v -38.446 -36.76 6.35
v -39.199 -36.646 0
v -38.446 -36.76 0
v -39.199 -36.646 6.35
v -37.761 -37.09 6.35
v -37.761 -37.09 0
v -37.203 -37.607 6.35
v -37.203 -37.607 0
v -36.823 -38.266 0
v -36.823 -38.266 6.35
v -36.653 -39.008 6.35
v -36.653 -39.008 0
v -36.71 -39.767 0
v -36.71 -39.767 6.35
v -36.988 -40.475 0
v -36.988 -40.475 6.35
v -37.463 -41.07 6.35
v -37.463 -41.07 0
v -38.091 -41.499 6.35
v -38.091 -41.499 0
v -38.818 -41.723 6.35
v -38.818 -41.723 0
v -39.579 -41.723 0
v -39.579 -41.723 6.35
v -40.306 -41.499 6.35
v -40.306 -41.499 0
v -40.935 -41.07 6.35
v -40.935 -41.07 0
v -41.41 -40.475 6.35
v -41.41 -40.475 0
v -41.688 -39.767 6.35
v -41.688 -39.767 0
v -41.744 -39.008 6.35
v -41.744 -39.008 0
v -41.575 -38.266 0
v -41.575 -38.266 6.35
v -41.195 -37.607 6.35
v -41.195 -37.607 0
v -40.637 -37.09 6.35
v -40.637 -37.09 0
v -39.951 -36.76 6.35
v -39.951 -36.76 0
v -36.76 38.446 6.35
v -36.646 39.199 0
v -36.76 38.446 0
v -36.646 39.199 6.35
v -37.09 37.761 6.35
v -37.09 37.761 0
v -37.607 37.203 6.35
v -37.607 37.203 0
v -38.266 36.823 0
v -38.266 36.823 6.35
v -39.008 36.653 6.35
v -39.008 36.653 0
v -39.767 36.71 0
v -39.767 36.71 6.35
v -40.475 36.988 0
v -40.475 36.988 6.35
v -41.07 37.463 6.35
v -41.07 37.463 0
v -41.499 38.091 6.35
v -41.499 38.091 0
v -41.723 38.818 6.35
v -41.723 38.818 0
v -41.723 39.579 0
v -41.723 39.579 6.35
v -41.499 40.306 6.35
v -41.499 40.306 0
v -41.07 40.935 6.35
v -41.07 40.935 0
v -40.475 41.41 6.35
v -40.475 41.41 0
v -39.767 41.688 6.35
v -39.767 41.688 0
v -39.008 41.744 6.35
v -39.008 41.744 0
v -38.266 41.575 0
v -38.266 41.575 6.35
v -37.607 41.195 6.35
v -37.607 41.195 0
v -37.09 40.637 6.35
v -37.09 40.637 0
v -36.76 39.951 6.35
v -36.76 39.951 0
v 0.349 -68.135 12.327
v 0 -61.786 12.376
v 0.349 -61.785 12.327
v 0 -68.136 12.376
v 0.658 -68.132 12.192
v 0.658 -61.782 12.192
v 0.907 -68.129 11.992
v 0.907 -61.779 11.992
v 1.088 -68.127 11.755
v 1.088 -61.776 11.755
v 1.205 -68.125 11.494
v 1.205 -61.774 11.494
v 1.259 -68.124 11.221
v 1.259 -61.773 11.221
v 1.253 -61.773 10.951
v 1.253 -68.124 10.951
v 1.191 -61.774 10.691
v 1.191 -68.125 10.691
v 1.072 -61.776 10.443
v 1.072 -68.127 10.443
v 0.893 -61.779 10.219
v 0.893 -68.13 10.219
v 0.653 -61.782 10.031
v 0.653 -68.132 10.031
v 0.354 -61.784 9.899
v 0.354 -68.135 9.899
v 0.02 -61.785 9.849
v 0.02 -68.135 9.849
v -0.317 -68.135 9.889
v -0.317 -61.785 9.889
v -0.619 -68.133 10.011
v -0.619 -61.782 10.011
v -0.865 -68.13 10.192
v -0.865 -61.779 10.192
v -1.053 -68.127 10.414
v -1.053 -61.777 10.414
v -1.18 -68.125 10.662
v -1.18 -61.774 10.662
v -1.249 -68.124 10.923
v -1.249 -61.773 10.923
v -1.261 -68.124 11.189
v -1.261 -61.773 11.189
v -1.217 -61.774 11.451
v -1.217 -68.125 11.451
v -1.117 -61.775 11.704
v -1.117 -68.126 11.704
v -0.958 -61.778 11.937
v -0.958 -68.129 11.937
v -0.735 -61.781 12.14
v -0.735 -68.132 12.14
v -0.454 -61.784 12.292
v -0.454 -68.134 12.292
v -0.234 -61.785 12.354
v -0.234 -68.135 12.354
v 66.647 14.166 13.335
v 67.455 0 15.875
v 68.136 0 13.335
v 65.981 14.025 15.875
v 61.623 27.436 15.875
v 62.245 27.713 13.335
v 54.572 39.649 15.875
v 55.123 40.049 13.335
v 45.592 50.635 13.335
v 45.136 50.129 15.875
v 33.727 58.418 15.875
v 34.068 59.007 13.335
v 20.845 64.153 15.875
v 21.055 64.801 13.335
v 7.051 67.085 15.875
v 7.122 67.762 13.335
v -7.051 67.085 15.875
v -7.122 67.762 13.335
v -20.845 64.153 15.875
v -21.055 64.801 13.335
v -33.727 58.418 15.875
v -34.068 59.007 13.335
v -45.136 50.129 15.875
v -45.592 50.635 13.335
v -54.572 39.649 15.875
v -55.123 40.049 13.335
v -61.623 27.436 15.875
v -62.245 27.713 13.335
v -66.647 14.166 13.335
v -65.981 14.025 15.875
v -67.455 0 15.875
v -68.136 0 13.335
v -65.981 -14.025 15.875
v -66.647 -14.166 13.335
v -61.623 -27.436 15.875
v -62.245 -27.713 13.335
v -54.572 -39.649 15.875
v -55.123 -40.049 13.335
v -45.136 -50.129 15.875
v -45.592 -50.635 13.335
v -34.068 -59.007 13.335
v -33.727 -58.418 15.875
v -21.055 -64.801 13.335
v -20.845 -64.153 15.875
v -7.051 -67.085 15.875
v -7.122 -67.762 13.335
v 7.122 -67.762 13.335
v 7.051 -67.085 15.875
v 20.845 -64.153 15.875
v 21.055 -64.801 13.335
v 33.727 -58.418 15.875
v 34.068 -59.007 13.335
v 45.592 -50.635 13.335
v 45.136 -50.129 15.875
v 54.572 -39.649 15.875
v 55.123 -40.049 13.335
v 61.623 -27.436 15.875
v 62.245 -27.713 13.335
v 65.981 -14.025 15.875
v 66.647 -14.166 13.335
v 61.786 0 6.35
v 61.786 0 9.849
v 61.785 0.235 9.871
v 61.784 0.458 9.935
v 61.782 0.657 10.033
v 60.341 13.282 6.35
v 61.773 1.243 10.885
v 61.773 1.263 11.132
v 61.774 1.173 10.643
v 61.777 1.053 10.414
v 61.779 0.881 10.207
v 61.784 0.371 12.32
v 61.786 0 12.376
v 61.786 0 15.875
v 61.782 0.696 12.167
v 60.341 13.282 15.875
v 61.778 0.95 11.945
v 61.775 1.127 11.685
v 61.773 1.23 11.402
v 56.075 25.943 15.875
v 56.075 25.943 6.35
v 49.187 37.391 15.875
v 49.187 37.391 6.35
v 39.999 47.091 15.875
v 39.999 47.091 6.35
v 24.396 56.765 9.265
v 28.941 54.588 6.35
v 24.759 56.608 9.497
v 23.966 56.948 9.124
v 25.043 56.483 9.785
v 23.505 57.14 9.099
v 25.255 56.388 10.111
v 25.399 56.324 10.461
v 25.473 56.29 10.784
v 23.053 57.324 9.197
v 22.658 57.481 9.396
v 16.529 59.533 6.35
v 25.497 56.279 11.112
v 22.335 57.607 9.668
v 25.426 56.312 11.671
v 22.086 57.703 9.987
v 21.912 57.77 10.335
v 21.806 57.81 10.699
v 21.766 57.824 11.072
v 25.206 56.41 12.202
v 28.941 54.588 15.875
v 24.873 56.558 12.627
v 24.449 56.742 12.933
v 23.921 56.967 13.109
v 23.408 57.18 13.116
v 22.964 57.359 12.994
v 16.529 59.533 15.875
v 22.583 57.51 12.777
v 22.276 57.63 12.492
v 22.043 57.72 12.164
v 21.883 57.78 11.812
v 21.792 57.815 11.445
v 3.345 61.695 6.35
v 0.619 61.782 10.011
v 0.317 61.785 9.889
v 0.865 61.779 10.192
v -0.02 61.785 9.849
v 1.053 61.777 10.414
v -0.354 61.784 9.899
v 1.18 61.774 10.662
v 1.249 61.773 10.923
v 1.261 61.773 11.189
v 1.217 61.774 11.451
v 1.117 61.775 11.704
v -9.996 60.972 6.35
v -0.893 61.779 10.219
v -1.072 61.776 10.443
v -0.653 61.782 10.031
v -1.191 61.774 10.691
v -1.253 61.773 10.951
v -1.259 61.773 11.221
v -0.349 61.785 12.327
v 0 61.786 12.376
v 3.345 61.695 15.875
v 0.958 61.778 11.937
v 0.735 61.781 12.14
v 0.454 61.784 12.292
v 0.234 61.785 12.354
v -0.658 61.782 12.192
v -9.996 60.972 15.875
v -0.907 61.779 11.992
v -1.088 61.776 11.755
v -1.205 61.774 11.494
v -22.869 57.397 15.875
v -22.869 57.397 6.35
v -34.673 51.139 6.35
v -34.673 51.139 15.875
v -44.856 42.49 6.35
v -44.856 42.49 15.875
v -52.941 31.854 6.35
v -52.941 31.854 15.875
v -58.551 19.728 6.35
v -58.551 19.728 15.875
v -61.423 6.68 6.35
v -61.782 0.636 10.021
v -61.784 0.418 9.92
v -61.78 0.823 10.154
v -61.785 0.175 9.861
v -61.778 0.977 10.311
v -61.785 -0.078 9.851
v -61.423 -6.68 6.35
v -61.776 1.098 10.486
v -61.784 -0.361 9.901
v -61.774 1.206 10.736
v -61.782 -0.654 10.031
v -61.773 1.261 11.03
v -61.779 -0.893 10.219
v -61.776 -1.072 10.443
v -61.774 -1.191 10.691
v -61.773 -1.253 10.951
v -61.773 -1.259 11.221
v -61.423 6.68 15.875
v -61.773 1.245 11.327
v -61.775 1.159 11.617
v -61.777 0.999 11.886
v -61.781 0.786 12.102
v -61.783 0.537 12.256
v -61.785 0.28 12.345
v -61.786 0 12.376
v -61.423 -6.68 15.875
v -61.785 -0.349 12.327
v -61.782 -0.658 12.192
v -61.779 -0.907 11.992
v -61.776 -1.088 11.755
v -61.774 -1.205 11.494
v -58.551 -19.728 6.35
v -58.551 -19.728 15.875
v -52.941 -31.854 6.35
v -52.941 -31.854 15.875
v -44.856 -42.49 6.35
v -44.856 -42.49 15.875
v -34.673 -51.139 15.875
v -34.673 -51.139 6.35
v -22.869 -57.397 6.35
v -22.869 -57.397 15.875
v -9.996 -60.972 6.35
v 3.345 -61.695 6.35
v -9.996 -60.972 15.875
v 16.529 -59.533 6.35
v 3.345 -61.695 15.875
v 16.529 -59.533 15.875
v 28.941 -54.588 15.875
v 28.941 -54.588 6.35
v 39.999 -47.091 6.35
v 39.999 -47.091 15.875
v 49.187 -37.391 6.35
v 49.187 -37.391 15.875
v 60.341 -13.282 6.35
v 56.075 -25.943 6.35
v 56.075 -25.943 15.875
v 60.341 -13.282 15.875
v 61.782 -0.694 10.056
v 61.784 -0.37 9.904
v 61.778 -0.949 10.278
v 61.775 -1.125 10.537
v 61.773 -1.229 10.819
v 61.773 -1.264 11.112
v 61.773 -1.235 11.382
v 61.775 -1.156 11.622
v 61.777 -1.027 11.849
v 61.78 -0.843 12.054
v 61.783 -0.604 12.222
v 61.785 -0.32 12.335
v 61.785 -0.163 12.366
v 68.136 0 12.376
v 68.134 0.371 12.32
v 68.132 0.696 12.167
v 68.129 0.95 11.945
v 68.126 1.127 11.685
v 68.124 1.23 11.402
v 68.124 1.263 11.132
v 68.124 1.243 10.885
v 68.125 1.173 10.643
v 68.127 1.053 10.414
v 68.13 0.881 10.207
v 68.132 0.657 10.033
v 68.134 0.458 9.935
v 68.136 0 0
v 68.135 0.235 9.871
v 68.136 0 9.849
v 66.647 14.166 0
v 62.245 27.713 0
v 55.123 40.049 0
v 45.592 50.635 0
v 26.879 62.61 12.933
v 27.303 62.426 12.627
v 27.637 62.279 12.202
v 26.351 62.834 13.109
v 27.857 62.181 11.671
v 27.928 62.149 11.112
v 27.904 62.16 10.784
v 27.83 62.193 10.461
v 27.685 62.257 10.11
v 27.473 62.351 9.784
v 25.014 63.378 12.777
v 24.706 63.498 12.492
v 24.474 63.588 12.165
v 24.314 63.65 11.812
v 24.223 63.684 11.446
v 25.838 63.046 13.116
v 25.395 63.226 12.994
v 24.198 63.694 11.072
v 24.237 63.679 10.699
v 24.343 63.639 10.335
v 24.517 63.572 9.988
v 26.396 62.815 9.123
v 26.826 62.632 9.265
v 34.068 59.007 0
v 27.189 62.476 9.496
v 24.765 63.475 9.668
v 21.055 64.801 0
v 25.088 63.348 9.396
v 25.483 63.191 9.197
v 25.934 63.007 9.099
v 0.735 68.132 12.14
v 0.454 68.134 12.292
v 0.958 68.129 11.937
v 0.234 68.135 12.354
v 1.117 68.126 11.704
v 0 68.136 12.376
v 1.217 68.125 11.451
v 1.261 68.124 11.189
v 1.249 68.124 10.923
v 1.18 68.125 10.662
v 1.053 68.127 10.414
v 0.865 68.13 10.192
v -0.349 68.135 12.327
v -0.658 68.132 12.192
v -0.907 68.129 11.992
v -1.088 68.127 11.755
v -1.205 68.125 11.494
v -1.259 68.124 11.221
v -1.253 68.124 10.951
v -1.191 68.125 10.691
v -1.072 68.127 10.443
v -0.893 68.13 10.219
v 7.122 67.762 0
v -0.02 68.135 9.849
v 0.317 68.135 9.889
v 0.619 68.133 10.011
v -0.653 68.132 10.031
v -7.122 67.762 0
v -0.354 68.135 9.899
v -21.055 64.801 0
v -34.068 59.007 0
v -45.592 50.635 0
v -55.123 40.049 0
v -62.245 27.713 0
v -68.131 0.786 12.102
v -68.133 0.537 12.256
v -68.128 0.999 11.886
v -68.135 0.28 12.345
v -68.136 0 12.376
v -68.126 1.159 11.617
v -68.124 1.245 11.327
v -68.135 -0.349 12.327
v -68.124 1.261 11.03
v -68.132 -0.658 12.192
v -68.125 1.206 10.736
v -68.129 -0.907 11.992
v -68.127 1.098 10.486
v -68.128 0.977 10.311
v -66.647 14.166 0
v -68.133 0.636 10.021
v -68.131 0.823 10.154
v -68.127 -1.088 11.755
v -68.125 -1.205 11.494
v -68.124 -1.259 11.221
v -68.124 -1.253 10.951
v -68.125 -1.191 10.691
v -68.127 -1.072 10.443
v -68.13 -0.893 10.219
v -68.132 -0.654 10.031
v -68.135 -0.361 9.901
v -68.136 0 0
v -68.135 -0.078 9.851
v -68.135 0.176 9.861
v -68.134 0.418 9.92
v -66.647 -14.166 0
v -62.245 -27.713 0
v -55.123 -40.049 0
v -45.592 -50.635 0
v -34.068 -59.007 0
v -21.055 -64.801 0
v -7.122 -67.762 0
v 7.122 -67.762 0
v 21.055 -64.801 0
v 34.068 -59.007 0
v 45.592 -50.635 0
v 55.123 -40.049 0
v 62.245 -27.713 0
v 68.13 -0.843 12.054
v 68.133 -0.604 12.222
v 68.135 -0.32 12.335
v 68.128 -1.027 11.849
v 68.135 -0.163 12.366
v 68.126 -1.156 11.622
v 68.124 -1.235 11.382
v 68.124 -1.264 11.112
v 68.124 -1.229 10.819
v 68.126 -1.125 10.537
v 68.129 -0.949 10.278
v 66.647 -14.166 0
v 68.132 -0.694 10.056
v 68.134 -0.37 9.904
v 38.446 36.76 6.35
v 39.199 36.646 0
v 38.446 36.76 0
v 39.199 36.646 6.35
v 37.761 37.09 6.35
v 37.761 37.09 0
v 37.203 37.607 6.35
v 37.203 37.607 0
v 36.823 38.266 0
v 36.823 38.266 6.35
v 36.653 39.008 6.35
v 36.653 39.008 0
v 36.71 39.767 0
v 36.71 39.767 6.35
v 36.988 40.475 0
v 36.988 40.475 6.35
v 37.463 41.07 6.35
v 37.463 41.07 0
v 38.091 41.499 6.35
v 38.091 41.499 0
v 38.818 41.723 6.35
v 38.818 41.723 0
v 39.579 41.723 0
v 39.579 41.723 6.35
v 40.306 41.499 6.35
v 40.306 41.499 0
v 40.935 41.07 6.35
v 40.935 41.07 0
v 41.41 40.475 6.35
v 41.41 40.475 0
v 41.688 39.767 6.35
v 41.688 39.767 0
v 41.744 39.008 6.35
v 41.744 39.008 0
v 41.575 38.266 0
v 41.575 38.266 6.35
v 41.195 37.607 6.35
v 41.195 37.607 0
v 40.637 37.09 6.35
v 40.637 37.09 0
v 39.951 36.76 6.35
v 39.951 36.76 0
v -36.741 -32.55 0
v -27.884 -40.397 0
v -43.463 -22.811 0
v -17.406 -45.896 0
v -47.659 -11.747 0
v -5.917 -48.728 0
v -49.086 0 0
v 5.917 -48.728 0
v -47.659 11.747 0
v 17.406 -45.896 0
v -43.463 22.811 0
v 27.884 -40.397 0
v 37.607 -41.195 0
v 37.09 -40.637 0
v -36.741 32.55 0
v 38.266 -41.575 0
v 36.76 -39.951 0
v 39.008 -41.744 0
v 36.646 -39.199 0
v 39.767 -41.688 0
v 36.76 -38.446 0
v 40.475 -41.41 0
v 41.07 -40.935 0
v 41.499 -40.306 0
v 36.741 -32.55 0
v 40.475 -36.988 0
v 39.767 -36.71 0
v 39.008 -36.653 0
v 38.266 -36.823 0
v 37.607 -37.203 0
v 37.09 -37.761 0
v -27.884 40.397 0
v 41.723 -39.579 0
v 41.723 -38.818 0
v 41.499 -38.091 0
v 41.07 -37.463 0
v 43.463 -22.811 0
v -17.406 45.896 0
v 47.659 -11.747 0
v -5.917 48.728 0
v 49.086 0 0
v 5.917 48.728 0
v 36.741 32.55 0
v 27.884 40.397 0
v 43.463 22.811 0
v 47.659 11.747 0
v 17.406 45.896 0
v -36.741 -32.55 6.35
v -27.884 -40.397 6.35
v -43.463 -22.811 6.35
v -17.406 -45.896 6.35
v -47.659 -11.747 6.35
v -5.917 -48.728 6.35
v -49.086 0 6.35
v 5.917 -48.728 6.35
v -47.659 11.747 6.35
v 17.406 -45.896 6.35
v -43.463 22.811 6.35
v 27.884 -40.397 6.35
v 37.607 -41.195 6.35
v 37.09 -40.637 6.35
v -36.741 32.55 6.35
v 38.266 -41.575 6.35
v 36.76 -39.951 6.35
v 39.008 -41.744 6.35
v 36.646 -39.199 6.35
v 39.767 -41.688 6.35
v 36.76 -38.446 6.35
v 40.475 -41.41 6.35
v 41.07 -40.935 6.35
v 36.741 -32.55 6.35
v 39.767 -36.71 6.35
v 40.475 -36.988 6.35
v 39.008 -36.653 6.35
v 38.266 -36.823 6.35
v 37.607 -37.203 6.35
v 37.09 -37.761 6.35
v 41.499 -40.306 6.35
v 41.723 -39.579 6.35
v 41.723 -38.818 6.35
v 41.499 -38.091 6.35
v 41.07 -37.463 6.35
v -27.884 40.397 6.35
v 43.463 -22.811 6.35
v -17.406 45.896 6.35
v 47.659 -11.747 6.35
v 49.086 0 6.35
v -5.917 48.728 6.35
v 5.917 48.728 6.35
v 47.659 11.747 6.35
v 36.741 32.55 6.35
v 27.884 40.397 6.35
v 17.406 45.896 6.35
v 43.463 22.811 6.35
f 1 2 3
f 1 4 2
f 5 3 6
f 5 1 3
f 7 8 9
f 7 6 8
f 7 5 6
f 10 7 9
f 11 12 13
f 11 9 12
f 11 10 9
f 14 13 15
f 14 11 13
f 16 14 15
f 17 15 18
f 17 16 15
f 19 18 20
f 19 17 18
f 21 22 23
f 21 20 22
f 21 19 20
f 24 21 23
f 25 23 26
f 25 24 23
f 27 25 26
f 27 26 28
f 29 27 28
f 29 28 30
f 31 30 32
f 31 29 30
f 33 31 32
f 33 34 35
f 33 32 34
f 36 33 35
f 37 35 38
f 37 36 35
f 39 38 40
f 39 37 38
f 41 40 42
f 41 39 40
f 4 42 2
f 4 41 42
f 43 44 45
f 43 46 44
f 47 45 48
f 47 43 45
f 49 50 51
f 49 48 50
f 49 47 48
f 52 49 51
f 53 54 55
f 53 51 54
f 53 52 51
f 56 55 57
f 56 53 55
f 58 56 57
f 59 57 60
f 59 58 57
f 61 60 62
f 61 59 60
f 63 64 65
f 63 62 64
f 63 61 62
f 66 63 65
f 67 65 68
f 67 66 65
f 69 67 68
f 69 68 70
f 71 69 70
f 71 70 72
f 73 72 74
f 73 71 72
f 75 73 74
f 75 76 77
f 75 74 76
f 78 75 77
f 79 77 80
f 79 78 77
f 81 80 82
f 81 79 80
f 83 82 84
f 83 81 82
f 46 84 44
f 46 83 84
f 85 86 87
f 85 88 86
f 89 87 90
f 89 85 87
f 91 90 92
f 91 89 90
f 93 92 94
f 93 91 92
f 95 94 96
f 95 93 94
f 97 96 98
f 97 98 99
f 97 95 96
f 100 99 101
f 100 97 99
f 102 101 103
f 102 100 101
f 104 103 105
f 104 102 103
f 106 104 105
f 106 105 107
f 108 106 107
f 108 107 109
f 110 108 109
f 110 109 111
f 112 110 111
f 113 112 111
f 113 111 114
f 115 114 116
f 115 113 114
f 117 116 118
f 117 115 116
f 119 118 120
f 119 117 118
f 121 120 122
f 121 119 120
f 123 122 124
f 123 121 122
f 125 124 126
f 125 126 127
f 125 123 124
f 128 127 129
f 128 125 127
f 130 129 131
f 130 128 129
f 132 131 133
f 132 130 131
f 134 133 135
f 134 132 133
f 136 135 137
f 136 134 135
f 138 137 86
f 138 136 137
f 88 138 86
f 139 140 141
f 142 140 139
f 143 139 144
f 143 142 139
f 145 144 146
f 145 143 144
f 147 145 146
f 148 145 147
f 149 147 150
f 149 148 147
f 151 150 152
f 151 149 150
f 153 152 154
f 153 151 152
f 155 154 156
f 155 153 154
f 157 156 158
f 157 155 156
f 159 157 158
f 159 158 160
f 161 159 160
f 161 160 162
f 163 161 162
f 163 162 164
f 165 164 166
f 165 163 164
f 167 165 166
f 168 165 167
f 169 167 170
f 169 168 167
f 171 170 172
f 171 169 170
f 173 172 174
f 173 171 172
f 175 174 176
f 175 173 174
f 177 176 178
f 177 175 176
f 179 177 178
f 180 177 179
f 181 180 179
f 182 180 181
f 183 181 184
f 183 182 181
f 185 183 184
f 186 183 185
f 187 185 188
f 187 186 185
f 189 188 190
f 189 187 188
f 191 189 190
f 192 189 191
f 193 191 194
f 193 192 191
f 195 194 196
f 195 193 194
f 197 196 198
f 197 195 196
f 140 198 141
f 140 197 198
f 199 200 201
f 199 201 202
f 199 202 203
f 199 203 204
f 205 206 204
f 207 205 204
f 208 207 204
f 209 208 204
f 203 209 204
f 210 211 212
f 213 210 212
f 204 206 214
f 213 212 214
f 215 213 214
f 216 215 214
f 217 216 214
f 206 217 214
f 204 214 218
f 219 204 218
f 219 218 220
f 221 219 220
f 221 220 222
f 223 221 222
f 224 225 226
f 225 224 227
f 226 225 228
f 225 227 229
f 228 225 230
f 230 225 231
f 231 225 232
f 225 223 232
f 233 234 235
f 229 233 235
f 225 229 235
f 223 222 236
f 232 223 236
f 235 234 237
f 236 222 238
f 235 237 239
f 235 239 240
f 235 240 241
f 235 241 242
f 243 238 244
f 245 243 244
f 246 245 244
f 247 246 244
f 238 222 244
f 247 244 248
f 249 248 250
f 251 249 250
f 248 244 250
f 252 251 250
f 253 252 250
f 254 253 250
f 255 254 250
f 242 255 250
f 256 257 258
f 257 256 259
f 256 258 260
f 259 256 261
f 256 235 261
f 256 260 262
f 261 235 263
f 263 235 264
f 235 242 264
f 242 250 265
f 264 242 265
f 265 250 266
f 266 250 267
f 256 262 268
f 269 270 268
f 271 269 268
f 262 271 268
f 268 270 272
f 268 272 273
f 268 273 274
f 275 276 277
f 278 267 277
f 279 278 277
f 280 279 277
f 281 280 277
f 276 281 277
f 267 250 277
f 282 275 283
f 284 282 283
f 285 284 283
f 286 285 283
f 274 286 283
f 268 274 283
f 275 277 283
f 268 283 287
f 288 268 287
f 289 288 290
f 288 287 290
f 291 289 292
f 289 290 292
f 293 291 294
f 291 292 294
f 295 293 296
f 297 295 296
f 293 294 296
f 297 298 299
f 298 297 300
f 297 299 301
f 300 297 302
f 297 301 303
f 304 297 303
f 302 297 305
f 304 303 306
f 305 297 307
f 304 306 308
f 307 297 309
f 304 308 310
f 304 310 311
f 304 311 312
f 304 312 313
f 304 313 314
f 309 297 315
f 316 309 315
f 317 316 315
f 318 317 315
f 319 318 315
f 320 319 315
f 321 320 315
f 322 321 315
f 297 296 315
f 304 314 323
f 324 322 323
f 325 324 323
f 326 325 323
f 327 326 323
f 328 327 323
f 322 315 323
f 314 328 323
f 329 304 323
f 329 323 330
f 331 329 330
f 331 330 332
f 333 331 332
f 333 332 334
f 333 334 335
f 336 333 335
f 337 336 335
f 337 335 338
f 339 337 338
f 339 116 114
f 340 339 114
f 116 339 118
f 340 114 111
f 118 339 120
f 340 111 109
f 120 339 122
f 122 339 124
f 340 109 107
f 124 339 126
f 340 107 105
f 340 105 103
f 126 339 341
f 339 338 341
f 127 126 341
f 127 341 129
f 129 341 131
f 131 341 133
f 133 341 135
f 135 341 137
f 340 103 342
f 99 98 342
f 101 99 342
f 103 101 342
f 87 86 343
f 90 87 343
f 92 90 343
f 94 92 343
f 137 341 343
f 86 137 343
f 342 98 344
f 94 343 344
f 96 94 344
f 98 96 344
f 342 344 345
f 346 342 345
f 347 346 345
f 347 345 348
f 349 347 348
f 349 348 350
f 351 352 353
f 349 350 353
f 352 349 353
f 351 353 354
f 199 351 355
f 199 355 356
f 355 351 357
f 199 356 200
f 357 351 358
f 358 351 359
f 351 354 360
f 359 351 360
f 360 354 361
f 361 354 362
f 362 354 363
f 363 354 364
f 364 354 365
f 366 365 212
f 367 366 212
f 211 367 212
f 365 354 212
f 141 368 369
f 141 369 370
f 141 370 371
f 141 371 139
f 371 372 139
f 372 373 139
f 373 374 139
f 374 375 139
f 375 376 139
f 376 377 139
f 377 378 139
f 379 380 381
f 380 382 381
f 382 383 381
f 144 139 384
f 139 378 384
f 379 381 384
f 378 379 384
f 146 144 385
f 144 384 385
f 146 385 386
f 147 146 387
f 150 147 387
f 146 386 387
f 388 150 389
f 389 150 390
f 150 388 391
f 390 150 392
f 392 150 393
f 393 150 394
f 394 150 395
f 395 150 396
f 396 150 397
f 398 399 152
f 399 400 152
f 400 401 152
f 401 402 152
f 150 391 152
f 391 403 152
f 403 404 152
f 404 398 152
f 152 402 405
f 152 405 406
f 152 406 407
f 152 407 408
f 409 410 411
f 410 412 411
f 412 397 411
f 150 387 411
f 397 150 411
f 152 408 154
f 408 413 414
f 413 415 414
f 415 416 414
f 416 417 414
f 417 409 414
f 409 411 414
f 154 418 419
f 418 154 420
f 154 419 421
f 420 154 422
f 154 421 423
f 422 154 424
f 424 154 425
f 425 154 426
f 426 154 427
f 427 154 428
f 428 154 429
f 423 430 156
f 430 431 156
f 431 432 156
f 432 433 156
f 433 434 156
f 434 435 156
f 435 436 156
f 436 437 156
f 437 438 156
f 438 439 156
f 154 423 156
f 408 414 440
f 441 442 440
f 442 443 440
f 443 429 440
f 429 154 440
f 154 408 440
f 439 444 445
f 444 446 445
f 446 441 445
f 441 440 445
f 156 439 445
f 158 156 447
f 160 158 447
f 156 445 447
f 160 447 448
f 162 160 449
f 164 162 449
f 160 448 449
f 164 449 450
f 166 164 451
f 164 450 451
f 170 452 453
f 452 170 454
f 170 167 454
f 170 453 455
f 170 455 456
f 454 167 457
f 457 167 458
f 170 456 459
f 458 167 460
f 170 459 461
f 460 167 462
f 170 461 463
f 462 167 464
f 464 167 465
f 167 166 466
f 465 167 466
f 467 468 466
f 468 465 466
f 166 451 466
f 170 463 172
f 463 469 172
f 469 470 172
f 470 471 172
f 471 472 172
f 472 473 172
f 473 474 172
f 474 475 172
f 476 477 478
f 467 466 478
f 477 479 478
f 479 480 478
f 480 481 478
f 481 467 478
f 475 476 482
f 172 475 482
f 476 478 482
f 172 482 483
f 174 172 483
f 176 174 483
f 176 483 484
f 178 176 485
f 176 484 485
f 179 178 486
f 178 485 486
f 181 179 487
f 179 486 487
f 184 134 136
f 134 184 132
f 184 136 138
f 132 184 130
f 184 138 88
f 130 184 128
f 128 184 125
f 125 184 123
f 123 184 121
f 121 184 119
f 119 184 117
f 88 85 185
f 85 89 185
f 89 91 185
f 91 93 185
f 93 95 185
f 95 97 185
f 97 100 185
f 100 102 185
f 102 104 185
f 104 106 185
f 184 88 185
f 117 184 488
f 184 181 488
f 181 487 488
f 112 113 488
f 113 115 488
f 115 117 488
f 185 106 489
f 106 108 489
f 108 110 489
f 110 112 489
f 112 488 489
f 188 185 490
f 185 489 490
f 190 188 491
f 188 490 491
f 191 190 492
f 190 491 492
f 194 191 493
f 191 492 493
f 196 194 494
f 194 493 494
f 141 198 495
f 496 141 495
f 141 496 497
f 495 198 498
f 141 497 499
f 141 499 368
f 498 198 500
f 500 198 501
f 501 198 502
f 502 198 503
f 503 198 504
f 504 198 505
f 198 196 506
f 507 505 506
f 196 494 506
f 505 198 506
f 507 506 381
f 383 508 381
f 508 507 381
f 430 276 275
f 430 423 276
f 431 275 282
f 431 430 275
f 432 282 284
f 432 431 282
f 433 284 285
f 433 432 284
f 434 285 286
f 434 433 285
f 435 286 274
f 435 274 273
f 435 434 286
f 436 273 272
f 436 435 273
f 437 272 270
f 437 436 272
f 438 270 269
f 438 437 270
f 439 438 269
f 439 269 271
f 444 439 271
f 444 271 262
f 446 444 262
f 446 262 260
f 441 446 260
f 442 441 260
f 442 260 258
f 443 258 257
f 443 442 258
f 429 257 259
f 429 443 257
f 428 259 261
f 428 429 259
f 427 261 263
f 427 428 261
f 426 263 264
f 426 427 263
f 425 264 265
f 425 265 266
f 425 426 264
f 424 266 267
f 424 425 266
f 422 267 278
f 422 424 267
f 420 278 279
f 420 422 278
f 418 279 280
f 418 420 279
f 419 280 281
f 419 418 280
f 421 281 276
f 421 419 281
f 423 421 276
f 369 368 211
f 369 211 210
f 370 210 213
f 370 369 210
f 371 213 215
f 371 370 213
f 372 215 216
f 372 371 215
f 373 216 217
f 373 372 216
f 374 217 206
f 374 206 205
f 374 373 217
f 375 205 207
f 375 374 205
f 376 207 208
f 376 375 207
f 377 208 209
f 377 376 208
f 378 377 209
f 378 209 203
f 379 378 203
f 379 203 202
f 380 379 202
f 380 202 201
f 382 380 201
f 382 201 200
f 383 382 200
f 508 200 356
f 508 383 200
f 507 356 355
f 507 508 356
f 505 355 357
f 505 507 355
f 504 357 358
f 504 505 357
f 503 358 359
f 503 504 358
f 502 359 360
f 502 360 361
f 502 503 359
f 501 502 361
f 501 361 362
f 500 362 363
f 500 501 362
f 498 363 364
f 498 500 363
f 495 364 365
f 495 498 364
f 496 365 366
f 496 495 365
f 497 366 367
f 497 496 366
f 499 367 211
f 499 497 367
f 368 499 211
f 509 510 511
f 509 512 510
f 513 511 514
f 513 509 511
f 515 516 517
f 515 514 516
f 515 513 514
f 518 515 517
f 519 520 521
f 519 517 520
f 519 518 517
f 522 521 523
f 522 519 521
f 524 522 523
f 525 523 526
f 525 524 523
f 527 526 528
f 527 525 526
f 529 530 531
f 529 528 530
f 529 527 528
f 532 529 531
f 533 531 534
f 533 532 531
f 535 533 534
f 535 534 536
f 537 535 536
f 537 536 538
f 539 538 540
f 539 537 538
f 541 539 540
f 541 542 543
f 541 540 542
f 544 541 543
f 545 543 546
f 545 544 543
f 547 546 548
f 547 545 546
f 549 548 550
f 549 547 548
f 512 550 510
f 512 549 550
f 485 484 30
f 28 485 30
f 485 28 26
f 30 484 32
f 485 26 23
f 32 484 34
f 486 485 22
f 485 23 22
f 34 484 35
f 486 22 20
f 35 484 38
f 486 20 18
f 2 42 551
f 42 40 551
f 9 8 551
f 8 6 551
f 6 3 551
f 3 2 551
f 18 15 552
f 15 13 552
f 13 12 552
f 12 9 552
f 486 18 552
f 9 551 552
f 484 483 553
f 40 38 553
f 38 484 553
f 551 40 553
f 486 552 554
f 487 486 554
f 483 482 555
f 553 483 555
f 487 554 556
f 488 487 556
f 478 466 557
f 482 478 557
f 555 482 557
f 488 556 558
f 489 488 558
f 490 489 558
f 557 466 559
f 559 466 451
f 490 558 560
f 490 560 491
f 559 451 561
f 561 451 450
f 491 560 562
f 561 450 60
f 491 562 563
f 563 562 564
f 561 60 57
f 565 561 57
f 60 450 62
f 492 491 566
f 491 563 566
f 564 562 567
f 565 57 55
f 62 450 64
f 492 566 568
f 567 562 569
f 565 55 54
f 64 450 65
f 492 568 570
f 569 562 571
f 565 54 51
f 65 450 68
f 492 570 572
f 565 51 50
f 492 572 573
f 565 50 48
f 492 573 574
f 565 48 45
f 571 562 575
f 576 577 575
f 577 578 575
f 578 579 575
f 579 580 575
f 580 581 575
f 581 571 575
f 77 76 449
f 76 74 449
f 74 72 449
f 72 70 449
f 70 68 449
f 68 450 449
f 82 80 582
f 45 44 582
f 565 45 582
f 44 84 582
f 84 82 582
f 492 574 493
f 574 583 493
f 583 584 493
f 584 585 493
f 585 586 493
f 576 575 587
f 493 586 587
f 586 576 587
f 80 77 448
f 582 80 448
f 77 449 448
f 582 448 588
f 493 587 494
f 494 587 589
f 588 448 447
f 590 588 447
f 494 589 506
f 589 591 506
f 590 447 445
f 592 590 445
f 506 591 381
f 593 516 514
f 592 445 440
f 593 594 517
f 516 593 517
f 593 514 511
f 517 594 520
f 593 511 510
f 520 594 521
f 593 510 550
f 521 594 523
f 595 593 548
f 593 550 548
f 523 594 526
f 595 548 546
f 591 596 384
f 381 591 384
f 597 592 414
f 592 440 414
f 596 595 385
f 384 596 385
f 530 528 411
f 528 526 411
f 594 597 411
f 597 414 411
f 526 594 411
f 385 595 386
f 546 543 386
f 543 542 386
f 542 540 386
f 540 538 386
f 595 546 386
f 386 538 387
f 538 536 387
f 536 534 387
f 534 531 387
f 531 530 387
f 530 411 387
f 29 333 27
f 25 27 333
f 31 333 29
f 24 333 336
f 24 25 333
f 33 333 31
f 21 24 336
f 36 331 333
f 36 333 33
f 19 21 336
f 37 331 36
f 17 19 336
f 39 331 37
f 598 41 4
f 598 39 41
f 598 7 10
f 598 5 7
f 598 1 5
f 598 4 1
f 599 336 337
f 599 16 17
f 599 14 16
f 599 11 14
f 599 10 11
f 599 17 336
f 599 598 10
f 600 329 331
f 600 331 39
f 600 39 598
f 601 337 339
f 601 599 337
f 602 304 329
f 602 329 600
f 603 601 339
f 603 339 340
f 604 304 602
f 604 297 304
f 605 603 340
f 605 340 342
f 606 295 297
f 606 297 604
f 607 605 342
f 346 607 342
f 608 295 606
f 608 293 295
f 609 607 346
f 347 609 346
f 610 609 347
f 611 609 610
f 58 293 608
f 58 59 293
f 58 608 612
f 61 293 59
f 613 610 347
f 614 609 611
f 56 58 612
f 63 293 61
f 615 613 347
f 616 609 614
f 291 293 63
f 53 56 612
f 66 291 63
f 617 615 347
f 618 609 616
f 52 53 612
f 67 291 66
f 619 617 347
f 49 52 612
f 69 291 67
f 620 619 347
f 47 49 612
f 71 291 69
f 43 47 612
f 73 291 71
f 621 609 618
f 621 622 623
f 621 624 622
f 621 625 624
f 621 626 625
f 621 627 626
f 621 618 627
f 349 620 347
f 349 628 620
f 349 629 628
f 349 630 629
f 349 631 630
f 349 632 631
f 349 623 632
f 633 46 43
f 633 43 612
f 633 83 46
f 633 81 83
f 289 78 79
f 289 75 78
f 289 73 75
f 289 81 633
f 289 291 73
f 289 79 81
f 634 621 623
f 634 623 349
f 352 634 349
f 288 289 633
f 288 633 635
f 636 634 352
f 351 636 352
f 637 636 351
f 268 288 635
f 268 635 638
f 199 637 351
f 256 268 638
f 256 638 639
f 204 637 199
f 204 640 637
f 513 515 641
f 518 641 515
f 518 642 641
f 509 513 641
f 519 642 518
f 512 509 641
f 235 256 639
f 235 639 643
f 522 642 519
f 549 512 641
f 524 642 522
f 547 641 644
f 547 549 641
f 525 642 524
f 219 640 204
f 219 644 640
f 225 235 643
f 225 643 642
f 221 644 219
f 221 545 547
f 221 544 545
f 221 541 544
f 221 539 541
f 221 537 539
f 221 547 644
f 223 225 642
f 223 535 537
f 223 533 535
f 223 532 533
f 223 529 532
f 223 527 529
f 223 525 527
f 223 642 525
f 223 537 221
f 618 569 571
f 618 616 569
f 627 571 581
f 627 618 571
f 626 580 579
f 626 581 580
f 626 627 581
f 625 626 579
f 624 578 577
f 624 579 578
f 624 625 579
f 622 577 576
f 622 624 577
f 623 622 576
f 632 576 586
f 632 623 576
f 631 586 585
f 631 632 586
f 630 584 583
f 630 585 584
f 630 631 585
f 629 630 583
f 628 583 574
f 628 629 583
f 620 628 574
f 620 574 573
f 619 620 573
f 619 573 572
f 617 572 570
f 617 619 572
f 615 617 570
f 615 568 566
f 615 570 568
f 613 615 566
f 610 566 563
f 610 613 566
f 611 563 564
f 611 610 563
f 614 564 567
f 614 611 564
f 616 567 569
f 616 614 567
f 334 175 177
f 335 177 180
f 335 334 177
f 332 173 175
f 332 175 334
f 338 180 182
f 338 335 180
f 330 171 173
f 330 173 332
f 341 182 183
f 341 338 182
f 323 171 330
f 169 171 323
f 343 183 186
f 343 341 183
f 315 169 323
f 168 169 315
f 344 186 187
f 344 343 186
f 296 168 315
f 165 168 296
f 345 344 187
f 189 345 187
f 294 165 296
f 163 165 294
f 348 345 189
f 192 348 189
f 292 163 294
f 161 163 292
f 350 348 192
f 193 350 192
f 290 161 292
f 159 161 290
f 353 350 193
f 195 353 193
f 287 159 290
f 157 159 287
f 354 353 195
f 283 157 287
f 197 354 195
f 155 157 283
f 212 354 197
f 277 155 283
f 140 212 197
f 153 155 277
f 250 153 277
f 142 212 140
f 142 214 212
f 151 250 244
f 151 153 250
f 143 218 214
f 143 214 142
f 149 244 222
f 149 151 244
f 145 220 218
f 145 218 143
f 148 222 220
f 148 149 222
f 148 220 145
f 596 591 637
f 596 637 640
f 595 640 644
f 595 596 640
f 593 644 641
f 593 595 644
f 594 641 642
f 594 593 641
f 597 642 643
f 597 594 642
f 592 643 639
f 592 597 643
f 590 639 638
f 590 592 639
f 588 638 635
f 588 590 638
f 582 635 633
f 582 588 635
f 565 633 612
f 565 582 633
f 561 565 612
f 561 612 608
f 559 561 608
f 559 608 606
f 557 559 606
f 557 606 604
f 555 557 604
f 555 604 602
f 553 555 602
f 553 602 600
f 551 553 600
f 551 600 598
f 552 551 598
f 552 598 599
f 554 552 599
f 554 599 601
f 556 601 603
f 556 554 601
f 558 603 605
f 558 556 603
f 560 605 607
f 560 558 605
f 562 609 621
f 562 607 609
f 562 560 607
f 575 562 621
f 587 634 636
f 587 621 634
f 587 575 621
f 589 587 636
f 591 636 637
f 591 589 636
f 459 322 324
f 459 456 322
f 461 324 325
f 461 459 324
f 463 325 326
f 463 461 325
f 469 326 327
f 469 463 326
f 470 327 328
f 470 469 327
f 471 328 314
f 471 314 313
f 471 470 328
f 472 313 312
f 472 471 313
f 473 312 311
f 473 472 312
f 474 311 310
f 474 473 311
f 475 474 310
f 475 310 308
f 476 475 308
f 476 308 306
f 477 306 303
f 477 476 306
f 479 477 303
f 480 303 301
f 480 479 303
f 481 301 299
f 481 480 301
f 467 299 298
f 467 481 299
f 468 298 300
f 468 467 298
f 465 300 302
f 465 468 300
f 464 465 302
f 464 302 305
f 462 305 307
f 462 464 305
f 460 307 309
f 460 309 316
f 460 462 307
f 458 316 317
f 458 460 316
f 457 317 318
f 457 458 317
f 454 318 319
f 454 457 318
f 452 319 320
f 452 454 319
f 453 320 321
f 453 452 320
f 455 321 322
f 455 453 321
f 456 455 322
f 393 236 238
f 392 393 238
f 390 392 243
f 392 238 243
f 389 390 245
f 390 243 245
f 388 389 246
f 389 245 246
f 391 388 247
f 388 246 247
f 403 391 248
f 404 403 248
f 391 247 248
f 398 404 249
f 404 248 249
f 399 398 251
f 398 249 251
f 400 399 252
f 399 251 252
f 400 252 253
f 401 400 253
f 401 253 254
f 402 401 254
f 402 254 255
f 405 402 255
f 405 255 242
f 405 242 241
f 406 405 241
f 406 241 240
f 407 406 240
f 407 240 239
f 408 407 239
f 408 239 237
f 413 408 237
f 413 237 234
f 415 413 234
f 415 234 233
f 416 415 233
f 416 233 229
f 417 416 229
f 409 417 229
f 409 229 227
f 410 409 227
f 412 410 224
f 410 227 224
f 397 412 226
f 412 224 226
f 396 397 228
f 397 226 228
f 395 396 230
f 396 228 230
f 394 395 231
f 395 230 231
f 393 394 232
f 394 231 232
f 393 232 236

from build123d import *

# Parameters (mm, degrees)
SKETCH1_R                       = 68.1355
SKETCH1_R_2                     = 49.0855
EXTRUDE1_DEPTH                  = 15.875
SKETCH2_R                       = 61.7855
EXTRUDE2_DEPTH                  = 9.525
F_21_0_159_DIAMETER_HOLE1_D     = 4.0386
F_21_0_159_DIAMETER_HOLE1_DEPTH = 12.7
F_21_0_159_DIAMETER_HOLE1_TIP   = 1.213317848
CIRPATTERN1_COUNT               = 4
CIRPATTERN2_COUNT               = 4
CHAMFER1_SIZE                   = 2.54
CHAMFER1_SIZE2                  = 0.680590949


with BuildPart() as part:
    # Sketch1 → Extrude1 (new body)
    with BuildSketch(Plane.XY):
        Circle(SKETCH1_R)
        Circle(SKETCH1_R_2, mode=Mode.SUBTRACT)
    extrude(amount=EXTRUDE1_DEPTH)

    # Sketch2 → Extrude2 (cut)
    with BuildSketch(Plane.XY.offset(15.875)):
        Circle(SKETCH2_R)
    extrude(amount=-EXTRUDE2_DEPTH, mode=Mode.SUBTRACT)

    # #21 (0.159) Diameter Hole1
    with Locations(Plane(origin=(26.074327006, 62.948993887, 11.1125), x_dir=(-0.9238795325112864, 0.38268343236509067, 0), z_dir=(0.38268343236509067, 0.9238795325112864, 0))):
        with Locations((0, 0)):
            Hole(F_21_0_159_DIAMETER_HOLE1_D / 2, depth=F_21_0_159_DIAMETER_HOLE1_DEPTH)
            with Locations((0, 0, -(F_21_0_159_DIAMETER_HOLE1_DEPTH + F_21_0_159_DIAMETER_HOLE1_TIP / 2))):  # 118° drill point
                Cone(0, F_21_0_159_DIAMETER_HOLE1_D / 2, F_21_0_159_DIAMETER_HOLE1_TIP, mode=Mode.SUBTRACT)

    # Sketch4 → #39 (0.0995) Diameter Hole2 (revolve, cut)
    with BuildSketch(Plane(origin=(0, 68.1355, 11.1125), x_dir=(0, 0, 1), z_dir=(1, 0, 0))):
        Polygon((0, 0), (0, 13.459277521), (1.26365, 12.7), (1.26365, 0), align=None)
    f_39_0_0995_diameter_hole2 = revolve(axis=Axis((0, 74.4855, 11.1125), (0, -1, 0)), mode=Mode.SUBTRACT)

    # CirPattern1: #39 (0.0995) Diameter Hole2 ×4 about axis
    cirpattern1_axis = Axis((0, 0, 15.875), (0, 0, -1))
    for i in range(1, CIRPATTERN1_COUNT):
        add(f_39_0_0995_diameter_hole2.rotate(cirpattern1_axis, i * 360 / CIRPATTERN1_COUNT), mode=Mode.SUBTRACT)

    # Sketch8 → #7 (0.201) Diameter Hole1 (revolve, cut)
    with BuildSketch(Plane(origin=(39.198817968, 39.198817968, 11.1125), x_dir=(0, -1, 0), z_dir=(1, 0, 0))):
        Polygon((0, 0), (0, 14.233816902), (2.5527, 12.7), (2.5527, 0), align=None)
    f_7_0_201_diameter_hole1 = revolve(axis=Axis((39.198817968, 39.198817968, 17.4625), (0, 0, -1)), mode=Mode.SUBTRACT)

    # CirPattern2: #7 (0.201) Diameter Hole1 ×4 about axis
    cirpattern2_axis = Axis((0, 0, 0), (0, 0, 1))
    for i in range(1, CIRPATTERN2_COUNT):
        add(f_7_0_201_diameter_hole1.rotate(cirpattern2_axis, i * 360 / CIRPATTERN2_COUNT), mode=Mode.SUBTRACT)

    # Chamfer1
    chamfer1_edges = [part.edges().sort_by_distance(p)[0] for p in [
        (-68.1355, 0, 15.875),
    ]]
    chamfer1_side = [part.faces().sort_by_distance(p)[0] for p in [
        (-68.1355, 0, 7.9375),
    ]]
    chamfer(chamfer1_edges, length=CHAMFER1_SIZE, length2=CHAMFER1_SIZE2, reference=chamfer1_side[0])


solid = part.part
